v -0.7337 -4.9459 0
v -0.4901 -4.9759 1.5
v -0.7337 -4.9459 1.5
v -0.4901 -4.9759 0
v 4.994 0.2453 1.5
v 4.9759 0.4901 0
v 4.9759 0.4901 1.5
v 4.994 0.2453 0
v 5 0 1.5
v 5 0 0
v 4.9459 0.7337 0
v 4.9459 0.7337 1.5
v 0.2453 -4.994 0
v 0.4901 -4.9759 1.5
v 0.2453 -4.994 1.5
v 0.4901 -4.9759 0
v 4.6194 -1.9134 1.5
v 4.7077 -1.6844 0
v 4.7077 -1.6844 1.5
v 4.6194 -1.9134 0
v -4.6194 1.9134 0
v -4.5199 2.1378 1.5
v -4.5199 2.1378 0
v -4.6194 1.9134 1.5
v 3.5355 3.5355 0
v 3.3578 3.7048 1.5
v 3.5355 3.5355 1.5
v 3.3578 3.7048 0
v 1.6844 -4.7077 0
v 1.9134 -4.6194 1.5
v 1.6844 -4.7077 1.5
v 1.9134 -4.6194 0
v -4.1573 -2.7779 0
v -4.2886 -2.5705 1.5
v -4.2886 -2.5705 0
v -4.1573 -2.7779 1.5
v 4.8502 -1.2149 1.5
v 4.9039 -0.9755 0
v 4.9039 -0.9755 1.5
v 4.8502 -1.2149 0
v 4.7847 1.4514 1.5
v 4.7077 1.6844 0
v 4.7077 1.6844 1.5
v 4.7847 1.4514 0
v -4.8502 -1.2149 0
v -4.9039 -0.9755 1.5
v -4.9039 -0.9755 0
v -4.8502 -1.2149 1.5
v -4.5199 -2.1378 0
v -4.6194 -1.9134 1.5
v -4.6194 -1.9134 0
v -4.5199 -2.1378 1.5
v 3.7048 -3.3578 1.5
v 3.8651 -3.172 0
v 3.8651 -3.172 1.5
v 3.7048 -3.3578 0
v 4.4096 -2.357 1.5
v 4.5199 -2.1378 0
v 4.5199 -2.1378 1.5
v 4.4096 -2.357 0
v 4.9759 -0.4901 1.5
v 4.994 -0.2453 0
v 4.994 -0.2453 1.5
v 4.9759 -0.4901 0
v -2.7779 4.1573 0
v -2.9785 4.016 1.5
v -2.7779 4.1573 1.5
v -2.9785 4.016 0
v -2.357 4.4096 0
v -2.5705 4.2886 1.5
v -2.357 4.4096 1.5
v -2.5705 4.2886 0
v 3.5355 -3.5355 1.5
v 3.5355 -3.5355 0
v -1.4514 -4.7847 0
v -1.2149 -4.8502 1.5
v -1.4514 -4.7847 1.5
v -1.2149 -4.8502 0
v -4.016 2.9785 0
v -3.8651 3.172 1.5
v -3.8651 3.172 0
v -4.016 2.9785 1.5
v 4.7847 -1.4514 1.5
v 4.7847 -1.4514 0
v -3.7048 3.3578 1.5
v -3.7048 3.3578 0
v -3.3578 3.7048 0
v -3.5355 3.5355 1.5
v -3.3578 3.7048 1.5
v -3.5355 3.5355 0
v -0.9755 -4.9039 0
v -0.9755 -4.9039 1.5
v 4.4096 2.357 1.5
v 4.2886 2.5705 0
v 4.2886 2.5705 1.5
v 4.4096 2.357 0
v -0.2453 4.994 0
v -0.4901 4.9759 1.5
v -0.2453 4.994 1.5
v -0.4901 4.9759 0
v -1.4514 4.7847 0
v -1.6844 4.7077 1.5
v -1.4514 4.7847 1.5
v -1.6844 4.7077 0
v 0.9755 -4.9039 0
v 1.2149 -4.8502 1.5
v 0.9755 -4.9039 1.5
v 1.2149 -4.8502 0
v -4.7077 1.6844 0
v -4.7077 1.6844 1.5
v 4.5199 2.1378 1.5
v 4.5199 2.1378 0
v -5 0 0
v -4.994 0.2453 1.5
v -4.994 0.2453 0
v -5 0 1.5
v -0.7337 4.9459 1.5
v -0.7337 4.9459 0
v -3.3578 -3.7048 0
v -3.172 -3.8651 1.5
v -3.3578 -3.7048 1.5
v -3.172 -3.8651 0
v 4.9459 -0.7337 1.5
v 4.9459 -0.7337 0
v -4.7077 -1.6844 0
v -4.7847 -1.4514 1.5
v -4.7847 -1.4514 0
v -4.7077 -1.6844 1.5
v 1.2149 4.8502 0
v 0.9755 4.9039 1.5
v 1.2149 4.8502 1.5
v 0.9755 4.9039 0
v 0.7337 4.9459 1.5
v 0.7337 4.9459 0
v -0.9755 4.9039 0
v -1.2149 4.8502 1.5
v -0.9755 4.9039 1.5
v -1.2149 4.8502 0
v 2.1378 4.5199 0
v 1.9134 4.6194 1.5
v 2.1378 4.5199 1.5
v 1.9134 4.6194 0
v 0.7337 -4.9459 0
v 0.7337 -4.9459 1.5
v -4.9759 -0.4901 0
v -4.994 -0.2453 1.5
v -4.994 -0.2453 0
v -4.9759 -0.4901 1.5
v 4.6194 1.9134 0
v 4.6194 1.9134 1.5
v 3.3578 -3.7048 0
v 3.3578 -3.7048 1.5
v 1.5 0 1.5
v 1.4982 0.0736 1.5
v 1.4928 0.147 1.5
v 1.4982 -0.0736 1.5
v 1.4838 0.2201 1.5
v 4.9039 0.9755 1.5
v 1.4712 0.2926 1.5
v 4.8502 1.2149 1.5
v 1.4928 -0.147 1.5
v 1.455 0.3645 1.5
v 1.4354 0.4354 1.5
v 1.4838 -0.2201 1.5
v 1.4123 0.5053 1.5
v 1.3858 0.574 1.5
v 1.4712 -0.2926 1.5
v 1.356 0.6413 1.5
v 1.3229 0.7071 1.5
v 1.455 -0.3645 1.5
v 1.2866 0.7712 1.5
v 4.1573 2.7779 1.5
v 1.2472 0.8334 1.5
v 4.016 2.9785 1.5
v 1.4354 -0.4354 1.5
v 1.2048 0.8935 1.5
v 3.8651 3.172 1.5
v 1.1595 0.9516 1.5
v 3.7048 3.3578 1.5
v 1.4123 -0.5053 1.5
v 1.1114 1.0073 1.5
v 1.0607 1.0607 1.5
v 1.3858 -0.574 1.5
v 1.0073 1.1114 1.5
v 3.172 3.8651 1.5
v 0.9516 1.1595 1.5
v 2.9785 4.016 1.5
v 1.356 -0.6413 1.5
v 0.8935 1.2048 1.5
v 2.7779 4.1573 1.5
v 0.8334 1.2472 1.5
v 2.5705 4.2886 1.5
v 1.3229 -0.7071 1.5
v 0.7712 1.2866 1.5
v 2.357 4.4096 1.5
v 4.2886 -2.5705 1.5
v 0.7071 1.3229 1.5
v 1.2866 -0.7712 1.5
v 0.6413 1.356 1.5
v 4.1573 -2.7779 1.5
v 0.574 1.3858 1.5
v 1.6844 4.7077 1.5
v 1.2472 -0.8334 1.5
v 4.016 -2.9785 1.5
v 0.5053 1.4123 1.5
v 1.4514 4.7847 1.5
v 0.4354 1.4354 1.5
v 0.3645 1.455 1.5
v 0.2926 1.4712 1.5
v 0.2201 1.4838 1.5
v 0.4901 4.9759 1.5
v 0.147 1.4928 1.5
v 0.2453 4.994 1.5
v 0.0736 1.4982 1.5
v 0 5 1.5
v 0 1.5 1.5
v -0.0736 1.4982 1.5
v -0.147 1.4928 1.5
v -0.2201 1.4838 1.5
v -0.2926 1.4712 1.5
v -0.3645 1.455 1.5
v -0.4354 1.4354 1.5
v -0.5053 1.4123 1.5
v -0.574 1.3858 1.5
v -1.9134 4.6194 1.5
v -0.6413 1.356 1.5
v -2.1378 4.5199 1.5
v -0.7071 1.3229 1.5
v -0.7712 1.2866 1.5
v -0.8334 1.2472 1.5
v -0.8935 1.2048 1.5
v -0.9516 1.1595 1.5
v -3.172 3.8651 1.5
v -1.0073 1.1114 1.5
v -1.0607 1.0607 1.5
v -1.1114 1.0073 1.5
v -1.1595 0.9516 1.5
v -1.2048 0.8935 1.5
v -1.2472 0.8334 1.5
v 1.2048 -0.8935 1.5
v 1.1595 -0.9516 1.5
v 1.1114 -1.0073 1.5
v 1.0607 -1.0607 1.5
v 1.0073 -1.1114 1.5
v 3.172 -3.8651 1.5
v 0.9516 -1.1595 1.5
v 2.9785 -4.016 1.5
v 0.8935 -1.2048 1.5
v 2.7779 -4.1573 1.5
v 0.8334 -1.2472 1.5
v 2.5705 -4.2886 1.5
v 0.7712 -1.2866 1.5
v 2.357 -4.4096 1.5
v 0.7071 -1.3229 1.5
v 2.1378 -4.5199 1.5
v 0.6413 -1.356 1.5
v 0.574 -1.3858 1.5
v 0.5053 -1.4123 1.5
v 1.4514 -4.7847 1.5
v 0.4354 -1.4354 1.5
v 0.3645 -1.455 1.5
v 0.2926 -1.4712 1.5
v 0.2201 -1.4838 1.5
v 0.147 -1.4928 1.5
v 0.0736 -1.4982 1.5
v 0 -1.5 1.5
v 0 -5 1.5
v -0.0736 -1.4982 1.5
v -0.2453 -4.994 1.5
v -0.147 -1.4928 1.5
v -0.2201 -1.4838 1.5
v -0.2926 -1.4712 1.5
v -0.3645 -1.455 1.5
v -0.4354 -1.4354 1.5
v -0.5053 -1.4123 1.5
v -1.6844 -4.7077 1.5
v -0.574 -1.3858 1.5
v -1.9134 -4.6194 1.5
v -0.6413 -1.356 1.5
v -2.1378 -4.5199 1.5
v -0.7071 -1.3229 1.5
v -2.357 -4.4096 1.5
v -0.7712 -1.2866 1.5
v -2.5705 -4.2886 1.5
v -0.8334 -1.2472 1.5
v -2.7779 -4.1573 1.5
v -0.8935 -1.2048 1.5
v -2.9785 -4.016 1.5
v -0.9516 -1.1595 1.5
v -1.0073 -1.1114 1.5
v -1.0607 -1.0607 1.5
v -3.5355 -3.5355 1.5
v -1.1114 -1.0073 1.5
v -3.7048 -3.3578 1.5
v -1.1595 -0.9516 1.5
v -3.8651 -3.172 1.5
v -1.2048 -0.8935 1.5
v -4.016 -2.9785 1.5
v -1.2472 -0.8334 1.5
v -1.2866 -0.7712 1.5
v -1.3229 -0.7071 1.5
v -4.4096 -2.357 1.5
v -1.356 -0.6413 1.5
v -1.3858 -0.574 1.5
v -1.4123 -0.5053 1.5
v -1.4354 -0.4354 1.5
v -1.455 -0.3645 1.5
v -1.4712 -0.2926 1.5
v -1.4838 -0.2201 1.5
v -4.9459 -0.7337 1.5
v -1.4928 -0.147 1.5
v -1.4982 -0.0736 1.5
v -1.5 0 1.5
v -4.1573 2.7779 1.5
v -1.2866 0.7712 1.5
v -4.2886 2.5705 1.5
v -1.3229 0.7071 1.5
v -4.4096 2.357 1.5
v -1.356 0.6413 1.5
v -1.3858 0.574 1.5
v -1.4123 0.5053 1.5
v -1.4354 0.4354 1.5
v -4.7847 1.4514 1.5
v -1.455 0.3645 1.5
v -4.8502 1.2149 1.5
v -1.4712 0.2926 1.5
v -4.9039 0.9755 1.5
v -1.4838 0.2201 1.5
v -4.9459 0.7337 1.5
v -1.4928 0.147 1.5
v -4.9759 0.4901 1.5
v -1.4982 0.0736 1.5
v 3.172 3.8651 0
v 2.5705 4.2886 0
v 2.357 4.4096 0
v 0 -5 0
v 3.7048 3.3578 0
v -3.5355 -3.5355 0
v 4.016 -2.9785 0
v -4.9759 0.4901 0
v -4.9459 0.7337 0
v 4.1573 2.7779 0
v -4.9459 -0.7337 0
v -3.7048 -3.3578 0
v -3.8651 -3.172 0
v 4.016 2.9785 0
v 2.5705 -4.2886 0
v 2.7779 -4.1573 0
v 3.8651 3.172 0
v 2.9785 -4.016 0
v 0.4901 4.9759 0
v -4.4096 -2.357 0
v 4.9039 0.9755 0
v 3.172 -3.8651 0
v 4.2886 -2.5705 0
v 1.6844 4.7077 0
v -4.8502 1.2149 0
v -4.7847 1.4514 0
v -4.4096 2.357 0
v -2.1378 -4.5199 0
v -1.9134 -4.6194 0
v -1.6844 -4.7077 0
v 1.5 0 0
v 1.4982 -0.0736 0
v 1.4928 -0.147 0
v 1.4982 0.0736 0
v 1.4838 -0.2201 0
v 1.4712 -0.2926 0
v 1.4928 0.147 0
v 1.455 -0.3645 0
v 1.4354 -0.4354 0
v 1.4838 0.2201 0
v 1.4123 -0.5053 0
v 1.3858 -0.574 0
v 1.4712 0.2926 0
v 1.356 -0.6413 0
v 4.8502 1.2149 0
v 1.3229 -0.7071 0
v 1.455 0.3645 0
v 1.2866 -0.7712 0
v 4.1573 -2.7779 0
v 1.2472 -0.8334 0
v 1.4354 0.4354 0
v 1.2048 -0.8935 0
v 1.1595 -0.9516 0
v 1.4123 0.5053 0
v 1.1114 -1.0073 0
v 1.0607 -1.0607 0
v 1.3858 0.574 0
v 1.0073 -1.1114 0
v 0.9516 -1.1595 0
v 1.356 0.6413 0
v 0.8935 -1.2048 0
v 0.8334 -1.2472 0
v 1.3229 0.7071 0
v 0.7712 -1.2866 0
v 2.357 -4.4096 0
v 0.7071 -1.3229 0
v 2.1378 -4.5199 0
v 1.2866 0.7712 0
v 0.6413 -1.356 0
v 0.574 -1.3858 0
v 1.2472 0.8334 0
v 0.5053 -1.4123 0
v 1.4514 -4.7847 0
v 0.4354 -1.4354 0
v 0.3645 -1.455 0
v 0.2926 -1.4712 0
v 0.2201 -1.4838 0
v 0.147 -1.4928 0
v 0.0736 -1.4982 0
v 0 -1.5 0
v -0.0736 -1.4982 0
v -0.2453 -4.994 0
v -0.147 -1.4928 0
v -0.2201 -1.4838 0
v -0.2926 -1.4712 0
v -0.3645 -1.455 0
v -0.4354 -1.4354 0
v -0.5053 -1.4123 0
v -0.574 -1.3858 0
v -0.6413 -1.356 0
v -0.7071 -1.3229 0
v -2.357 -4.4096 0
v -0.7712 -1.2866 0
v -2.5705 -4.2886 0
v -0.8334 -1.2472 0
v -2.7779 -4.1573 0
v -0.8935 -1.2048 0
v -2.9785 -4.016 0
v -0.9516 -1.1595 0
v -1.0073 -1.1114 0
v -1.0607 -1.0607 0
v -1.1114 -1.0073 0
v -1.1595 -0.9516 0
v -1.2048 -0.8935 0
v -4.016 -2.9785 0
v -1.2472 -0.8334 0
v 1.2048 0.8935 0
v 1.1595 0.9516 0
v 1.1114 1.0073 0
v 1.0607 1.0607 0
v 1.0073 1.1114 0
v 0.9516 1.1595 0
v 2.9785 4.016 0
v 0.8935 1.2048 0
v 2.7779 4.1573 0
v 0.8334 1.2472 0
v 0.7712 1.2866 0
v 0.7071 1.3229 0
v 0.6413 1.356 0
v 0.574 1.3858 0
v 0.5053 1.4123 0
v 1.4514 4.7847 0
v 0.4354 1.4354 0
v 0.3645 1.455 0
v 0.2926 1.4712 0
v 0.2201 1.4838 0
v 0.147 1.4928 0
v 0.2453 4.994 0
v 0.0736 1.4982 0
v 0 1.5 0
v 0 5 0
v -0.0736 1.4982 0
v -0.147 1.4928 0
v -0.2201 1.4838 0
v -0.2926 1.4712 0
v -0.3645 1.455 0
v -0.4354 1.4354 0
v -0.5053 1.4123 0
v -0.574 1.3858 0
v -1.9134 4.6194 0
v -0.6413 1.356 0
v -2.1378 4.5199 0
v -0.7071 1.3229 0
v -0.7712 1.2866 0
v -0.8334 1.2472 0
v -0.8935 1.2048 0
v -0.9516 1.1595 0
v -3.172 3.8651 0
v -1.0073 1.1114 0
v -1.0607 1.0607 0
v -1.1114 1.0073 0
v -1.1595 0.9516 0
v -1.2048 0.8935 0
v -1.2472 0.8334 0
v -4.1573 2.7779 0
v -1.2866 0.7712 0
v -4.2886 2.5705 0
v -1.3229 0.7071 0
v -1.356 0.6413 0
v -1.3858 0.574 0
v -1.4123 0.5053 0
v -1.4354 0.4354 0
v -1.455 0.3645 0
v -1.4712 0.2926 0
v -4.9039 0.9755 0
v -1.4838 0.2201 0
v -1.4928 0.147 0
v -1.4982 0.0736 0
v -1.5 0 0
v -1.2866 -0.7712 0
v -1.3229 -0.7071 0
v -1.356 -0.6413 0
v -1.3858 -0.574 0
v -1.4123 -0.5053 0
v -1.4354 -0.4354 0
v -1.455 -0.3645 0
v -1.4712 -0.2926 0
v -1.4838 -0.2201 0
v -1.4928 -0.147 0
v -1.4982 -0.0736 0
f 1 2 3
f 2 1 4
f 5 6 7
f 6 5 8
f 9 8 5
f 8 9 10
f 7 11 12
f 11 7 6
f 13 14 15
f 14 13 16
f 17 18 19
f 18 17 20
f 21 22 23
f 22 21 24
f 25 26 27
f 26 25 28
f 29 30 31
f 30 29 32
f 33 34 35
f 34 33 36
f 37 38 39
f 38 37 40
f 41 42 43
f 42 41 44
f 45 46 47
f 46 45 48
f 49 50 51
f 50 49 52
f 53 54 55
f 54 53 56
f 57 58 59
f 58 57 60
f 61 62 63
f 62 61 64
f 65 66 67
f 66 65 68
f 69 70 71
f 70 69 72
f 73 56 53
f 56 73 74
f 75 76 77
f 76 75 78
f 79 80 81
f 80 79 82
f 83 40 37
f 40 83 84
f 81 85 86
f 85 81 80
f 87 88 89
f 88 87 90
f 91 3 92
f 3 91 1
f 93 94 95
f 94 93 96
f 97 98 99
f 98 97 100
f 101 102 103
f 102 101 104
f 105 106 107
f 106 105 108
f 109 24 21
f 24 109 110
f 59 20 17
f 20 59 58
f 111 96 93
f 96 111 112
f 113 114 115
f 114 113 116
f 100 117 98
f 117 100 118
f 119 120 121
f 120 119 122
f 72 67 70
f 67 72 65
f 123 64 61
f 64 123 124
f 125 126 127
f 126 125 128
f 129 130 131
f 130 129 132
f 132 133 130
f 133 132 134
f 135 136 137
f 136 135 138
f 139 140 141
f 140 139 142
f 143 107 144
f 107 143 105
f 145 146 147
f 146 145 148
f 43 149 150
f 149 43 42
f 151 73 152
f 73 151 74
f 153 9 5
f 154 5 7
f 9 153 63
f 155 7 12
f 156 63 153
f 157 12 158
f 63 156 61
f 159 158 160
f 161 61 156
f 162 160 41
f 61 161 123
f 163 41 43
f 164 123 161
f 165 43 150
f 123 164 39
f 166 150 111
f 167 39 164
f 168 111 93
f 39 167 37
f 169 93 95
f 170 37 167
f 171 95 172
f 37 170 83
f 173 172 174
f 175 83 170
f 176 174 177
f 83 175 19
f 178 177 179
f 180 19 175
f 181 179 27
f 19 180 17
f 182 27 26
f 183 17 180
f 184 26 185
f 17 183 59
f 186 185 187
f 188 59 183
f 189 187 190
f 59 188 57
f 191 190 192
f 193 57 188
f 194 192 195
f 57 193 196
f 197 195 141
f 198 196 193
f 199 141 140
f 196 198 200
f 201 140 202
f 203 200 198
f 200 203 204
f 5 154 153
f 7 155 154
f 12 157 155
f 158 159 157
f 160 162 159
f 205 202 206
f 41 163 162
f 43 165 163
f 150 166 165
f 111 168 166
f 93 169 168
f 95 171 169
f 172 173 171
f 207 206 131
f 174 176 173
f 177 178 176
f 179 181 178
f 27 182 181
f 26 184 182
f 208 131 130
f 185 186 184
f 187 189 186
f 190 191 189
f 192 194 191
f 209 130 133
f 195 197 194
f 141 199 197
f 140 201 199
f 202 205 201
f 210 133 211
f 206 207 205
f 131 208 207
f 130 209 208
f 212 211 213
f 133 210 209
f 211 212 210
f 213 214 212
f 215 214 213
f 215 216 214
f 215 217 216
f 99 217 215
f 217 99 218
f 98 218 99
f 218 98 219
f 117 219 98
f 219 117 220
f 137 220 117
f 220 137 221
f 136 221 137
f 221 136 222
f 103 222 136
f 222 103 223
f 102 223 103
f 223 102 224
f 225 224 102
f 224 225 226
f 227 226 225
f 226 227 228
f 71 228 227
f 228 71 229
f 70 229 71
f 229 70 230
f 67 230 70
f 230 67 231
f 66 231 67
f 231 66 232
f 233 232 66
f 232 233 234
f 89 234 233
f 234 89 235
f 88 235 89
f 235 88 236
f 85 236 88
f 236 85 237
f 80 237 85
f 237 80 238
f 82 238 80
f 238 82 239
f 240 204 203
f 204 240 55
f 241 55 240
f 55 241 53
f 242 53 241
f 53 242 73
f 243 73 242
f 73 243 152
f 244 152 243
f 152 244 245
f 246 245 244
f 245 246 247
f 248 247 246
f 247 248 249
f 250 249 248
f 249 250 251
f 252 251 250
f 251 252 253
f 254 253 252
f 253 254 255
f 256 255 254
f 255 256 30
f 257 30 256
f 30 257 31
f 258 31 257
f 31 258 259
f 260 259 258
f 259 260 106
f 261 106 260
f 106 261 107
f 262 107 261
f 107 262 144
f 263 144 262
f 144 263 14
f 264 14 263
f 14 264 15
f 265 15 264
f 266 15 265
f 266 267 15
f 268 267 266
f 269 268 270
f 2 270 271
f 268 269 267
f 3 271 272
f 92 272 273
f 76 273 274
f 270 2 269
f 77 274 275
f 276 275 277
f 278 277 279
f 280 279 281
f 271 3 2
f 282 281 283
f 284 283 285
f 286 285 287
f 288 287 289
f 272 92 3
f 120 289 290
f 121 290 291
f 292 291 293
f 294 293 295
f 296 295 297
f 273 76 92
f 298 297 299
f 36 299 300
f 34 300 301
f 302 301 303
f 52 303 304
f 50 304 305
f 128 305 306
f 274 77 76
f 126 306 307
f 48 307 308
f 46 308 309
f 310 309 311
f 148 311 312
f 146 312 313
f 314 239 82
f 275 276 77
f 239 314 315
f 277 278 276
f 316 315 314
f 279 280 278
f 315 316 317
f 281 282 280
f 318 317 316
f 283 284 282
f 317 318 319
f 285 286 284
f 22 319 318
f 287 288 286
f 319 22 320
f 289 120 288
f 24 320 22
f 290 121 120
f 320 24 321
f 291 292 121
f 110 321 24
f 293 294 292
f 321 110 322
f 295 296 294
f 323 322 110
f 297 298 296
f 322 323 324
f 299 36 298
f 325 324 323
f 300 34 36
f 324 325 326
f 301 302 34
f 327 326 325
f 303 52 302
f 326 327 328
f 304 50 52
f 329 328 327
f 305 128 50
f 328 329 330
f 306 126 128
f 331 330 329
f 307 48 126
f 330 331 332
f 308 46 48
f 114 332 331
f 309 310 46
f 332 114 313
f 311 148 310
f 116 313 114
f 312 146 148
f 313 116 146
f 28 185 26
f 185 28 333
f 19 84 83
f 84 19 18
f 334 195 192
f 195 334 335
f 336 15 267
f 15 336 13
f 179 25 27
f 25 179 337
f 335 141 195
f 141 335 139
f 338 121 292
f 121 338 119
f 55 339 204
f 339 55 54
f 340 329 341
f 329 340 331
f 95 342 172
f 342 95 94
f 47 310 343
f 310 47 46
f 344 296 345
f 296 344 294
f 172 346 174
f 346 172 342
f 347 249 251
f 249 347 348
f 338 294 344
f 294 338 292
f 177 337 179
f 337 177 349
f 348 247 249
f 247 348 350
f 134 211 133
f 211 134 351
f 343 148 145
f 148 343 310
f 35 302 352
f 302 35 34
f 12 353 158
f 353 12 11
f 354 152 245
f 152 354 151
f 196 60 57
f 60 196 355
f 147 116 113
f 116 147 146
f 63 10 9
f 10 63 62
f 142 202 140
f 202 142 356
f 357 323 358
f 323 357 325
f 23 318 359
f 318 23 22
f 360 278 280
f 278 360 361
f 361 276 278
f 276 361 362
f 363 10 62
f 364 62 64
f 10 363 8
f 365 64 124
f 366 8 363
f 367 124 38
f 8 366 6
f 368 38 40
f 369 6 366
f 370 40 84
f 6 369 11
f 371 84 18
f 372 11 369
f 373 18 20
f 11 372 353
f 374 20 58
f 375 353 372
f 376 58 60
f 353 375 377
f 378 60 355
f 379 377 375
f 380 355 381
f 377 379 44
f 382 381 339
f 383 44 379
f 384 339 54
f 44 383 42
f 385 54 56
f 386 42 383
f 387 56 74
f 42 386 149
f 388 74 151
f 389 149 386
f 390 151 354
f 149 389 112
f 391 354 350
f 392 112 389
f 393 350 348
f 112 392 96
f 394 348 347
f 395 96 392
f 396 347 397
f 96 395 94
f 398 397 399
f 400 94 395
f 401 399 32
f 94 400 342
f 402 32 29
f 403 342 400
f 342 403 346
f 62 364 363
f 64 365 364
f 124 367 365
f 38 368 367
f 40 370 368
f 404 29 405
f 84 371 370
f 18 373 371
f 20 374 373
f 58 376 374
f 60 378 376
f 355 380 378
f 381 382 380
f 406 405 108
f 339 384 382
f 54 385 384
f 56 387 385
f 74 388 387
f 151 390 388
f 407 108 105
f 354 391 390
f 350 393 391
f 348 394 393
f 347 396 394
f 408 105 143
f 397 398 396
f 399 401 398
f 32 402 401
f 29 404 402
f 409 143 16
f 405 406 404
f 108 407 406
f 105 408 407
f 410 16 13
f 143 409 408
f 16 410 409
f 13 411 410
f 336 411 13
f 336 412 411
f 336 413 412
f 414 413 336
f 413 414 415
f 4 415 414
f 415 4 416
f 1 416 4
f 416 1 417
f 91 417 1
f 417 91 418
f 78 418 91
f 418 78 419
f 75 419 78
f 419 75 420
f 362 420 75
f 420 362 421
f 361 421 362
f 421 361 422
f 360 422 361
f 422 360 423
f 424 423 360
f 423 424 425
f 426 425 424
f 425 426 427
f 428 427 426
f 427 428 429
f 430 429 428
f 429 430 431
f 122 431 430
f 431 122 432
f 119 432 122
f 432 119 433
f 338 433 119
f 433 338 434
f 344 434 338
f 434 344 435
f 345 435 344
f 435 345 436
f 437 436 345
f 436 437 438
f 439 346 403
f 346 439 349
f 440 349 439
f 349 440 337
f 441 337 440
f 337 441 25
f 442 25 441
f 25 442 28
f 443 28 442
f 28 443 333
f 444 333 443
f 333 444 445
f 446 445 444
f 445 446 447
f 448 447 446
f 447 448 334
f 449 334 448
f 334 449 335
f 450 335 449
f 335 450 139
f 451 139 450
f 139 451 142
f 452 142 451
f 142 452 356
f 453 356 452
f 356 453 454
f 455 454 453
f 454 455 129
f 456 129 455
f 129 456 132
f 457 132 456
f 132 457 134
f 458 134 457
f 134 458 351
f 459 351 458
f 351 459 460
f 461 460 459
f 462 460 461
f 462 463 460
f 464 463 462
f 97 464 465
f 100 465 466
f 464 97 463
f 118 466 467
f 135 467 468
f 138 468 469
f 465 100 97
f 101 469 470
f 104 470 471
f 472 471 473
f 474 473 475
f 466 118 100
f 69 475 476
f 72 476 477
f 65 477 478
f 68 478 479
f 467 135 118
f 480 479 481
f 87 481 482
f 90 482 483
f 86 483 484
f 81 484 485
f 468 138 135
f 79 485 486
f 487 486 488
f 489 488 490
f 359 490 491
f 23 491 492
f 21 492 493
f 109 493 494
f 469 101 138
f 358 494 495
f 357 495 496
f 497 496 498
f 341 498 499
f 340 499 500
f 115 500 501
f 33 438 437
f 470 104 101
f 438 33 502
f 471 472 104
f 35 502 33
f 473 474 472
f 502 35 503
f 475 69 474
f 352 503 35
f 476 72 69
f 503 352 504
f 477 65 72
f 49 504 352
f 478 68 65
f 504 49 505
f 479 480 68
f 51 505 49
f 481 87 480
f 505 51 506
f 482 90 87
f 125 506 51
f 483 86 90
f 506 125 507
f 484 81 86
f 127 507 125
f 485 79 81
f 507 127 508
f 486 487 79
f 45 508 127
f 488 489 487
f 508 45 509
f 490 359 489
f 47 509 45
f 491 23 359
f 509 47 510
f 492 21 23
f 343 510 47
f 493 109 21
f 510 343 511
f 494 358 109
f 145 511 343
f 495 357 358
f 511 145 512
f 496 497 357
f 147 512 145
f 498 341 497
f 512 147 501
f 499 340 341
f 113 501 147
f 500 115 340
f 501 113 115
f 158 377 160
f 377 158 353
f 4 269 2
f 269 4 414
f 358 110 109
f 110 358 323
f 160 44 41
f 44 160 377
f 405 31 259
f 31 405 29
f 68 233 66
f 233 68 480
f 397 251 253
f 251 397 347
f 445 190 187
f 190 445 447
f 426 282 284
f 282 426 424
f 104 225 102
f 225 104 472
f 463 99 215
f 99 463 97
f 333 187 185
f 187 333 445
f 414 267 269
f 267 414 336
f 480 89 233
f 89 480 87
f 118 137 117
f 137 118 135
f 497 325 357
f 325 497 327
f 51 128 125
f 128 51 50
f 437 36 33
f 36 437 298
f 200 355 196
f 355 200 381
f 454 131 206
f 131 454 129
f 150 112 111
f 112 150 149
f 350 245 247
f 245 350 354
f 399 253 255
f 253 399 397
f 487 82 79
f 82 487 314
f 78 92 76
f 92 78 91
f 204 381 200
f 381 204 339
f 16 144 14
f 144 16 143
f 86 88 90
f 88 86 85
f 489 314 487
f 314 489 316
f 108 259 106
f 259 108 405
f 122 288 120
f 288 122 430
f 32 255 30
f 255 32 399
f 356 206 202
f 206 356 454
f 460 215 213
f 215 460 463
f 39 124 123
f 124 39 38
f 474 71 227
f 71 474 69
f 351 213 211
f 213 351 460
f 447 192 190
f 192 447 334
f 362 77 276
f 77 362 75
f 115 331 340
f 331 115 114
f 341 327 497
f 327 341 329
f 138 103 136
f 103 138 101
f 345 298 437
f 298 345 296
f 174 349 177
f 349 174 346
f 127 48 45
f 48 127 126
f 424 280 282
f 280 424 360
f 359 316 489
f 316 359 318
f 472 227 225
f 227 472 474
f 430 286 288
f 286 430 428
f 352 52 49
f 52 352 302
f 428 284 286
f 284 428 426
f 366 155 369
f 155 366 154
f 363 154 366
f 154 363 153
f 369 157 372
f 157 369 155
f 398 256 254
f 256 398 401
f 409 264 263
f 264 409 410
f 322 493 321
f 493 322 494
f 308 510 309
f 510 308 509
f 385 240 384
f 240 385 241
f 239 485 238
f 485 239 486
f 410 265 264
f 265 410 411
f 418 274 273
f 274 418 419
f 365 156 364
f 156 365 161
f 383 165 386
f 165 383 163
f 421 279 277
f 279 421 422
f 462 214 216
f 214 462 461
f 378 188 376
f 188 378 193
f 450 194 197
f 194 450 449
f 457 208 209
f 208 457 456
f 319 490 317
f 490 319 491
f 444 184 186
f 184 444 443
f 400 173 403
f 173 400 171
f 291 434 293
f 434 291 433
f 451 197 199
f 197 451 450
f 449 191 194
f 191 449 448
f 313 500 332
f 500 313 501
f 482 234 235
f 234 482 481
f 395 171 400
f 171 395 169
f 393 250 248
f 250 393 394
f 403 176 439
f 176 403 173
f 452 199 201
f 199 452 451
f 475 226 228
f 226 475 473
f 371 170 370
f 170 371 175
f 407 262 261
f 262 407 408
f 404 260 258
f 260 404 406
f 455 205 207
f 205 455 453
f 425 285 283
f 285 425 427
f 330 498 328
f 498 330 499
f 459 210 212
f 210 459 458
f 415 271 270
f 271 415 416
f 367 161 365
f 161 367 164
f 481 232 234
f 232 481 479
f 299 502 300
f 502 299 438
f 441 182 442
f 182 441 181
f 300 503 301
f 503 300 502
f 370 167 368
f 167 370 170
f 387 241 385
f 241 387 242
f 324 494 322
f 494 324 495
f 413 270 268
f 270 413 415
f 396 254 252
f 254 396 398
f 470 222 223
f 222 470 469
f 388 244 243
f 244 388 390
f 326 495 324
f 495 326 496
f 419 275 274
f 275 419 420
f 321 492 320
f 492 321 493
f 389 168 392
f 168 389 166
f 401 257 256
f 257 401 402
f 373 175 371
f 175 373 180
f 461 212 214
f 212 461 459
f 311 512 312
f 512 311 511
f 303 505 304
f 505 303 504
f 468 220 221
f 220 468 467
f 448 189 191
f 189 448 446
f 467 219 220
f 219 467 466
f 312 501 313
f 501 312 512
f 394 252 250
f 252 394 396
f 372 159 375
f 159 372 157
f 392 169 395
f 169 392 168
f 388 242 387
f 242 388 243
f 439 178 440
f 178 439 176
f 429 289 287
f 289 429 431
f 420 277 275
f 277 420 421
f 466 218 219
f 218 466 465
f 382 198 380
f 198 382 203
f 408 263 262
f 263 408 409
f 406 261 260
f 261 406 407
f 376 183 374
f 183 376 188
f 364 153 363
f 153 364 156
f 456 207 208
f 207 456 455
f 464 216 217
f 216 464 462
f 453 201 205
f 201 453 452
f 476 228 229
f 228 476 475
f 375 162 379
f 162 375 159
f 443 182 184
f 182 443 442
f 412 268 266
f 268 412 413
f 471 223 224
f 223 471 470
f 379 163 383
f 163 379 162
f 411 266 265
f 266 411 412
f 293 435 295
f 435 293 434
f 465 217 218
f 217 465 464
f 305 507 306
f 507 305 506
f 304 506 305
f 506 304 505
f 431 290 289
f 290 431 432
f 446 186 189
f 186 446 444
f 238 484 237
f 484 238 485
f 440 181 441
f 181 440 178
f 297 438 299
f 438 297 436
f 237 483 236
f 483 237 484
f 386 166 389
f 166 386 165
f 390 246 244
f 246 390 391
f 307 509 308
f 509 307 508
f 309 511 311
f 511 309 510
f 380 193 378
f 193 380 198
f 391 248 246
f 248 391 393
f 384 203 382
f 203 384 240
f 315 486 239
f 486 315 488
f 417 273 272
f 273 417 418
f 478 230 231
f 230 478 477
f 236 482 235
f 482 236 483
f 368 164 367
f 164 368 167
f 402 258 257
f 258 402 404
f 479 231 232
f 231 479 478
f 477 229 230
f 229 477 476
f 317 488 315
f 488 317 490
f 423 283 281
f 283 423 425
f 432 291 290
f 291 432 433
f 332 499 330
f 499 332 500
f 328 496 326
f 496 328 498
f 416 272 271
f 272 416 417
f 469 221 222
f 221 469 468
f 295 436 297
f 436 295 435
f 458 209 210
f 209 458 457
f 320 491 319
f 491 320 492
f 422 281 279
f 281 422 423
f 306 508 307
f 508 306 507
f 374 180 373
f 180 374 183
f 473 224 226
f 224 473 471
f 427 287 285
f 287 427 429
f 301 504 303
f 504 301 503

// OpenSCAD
$fn = 128;

inner_d = 3.0;
outer_d = 10.0;
thickness = 1.5;

difference() {
  cylinder(d = outer_d, h = thickness);
  cylinder(d = inner_d, h = thickness + 0.2);
}
